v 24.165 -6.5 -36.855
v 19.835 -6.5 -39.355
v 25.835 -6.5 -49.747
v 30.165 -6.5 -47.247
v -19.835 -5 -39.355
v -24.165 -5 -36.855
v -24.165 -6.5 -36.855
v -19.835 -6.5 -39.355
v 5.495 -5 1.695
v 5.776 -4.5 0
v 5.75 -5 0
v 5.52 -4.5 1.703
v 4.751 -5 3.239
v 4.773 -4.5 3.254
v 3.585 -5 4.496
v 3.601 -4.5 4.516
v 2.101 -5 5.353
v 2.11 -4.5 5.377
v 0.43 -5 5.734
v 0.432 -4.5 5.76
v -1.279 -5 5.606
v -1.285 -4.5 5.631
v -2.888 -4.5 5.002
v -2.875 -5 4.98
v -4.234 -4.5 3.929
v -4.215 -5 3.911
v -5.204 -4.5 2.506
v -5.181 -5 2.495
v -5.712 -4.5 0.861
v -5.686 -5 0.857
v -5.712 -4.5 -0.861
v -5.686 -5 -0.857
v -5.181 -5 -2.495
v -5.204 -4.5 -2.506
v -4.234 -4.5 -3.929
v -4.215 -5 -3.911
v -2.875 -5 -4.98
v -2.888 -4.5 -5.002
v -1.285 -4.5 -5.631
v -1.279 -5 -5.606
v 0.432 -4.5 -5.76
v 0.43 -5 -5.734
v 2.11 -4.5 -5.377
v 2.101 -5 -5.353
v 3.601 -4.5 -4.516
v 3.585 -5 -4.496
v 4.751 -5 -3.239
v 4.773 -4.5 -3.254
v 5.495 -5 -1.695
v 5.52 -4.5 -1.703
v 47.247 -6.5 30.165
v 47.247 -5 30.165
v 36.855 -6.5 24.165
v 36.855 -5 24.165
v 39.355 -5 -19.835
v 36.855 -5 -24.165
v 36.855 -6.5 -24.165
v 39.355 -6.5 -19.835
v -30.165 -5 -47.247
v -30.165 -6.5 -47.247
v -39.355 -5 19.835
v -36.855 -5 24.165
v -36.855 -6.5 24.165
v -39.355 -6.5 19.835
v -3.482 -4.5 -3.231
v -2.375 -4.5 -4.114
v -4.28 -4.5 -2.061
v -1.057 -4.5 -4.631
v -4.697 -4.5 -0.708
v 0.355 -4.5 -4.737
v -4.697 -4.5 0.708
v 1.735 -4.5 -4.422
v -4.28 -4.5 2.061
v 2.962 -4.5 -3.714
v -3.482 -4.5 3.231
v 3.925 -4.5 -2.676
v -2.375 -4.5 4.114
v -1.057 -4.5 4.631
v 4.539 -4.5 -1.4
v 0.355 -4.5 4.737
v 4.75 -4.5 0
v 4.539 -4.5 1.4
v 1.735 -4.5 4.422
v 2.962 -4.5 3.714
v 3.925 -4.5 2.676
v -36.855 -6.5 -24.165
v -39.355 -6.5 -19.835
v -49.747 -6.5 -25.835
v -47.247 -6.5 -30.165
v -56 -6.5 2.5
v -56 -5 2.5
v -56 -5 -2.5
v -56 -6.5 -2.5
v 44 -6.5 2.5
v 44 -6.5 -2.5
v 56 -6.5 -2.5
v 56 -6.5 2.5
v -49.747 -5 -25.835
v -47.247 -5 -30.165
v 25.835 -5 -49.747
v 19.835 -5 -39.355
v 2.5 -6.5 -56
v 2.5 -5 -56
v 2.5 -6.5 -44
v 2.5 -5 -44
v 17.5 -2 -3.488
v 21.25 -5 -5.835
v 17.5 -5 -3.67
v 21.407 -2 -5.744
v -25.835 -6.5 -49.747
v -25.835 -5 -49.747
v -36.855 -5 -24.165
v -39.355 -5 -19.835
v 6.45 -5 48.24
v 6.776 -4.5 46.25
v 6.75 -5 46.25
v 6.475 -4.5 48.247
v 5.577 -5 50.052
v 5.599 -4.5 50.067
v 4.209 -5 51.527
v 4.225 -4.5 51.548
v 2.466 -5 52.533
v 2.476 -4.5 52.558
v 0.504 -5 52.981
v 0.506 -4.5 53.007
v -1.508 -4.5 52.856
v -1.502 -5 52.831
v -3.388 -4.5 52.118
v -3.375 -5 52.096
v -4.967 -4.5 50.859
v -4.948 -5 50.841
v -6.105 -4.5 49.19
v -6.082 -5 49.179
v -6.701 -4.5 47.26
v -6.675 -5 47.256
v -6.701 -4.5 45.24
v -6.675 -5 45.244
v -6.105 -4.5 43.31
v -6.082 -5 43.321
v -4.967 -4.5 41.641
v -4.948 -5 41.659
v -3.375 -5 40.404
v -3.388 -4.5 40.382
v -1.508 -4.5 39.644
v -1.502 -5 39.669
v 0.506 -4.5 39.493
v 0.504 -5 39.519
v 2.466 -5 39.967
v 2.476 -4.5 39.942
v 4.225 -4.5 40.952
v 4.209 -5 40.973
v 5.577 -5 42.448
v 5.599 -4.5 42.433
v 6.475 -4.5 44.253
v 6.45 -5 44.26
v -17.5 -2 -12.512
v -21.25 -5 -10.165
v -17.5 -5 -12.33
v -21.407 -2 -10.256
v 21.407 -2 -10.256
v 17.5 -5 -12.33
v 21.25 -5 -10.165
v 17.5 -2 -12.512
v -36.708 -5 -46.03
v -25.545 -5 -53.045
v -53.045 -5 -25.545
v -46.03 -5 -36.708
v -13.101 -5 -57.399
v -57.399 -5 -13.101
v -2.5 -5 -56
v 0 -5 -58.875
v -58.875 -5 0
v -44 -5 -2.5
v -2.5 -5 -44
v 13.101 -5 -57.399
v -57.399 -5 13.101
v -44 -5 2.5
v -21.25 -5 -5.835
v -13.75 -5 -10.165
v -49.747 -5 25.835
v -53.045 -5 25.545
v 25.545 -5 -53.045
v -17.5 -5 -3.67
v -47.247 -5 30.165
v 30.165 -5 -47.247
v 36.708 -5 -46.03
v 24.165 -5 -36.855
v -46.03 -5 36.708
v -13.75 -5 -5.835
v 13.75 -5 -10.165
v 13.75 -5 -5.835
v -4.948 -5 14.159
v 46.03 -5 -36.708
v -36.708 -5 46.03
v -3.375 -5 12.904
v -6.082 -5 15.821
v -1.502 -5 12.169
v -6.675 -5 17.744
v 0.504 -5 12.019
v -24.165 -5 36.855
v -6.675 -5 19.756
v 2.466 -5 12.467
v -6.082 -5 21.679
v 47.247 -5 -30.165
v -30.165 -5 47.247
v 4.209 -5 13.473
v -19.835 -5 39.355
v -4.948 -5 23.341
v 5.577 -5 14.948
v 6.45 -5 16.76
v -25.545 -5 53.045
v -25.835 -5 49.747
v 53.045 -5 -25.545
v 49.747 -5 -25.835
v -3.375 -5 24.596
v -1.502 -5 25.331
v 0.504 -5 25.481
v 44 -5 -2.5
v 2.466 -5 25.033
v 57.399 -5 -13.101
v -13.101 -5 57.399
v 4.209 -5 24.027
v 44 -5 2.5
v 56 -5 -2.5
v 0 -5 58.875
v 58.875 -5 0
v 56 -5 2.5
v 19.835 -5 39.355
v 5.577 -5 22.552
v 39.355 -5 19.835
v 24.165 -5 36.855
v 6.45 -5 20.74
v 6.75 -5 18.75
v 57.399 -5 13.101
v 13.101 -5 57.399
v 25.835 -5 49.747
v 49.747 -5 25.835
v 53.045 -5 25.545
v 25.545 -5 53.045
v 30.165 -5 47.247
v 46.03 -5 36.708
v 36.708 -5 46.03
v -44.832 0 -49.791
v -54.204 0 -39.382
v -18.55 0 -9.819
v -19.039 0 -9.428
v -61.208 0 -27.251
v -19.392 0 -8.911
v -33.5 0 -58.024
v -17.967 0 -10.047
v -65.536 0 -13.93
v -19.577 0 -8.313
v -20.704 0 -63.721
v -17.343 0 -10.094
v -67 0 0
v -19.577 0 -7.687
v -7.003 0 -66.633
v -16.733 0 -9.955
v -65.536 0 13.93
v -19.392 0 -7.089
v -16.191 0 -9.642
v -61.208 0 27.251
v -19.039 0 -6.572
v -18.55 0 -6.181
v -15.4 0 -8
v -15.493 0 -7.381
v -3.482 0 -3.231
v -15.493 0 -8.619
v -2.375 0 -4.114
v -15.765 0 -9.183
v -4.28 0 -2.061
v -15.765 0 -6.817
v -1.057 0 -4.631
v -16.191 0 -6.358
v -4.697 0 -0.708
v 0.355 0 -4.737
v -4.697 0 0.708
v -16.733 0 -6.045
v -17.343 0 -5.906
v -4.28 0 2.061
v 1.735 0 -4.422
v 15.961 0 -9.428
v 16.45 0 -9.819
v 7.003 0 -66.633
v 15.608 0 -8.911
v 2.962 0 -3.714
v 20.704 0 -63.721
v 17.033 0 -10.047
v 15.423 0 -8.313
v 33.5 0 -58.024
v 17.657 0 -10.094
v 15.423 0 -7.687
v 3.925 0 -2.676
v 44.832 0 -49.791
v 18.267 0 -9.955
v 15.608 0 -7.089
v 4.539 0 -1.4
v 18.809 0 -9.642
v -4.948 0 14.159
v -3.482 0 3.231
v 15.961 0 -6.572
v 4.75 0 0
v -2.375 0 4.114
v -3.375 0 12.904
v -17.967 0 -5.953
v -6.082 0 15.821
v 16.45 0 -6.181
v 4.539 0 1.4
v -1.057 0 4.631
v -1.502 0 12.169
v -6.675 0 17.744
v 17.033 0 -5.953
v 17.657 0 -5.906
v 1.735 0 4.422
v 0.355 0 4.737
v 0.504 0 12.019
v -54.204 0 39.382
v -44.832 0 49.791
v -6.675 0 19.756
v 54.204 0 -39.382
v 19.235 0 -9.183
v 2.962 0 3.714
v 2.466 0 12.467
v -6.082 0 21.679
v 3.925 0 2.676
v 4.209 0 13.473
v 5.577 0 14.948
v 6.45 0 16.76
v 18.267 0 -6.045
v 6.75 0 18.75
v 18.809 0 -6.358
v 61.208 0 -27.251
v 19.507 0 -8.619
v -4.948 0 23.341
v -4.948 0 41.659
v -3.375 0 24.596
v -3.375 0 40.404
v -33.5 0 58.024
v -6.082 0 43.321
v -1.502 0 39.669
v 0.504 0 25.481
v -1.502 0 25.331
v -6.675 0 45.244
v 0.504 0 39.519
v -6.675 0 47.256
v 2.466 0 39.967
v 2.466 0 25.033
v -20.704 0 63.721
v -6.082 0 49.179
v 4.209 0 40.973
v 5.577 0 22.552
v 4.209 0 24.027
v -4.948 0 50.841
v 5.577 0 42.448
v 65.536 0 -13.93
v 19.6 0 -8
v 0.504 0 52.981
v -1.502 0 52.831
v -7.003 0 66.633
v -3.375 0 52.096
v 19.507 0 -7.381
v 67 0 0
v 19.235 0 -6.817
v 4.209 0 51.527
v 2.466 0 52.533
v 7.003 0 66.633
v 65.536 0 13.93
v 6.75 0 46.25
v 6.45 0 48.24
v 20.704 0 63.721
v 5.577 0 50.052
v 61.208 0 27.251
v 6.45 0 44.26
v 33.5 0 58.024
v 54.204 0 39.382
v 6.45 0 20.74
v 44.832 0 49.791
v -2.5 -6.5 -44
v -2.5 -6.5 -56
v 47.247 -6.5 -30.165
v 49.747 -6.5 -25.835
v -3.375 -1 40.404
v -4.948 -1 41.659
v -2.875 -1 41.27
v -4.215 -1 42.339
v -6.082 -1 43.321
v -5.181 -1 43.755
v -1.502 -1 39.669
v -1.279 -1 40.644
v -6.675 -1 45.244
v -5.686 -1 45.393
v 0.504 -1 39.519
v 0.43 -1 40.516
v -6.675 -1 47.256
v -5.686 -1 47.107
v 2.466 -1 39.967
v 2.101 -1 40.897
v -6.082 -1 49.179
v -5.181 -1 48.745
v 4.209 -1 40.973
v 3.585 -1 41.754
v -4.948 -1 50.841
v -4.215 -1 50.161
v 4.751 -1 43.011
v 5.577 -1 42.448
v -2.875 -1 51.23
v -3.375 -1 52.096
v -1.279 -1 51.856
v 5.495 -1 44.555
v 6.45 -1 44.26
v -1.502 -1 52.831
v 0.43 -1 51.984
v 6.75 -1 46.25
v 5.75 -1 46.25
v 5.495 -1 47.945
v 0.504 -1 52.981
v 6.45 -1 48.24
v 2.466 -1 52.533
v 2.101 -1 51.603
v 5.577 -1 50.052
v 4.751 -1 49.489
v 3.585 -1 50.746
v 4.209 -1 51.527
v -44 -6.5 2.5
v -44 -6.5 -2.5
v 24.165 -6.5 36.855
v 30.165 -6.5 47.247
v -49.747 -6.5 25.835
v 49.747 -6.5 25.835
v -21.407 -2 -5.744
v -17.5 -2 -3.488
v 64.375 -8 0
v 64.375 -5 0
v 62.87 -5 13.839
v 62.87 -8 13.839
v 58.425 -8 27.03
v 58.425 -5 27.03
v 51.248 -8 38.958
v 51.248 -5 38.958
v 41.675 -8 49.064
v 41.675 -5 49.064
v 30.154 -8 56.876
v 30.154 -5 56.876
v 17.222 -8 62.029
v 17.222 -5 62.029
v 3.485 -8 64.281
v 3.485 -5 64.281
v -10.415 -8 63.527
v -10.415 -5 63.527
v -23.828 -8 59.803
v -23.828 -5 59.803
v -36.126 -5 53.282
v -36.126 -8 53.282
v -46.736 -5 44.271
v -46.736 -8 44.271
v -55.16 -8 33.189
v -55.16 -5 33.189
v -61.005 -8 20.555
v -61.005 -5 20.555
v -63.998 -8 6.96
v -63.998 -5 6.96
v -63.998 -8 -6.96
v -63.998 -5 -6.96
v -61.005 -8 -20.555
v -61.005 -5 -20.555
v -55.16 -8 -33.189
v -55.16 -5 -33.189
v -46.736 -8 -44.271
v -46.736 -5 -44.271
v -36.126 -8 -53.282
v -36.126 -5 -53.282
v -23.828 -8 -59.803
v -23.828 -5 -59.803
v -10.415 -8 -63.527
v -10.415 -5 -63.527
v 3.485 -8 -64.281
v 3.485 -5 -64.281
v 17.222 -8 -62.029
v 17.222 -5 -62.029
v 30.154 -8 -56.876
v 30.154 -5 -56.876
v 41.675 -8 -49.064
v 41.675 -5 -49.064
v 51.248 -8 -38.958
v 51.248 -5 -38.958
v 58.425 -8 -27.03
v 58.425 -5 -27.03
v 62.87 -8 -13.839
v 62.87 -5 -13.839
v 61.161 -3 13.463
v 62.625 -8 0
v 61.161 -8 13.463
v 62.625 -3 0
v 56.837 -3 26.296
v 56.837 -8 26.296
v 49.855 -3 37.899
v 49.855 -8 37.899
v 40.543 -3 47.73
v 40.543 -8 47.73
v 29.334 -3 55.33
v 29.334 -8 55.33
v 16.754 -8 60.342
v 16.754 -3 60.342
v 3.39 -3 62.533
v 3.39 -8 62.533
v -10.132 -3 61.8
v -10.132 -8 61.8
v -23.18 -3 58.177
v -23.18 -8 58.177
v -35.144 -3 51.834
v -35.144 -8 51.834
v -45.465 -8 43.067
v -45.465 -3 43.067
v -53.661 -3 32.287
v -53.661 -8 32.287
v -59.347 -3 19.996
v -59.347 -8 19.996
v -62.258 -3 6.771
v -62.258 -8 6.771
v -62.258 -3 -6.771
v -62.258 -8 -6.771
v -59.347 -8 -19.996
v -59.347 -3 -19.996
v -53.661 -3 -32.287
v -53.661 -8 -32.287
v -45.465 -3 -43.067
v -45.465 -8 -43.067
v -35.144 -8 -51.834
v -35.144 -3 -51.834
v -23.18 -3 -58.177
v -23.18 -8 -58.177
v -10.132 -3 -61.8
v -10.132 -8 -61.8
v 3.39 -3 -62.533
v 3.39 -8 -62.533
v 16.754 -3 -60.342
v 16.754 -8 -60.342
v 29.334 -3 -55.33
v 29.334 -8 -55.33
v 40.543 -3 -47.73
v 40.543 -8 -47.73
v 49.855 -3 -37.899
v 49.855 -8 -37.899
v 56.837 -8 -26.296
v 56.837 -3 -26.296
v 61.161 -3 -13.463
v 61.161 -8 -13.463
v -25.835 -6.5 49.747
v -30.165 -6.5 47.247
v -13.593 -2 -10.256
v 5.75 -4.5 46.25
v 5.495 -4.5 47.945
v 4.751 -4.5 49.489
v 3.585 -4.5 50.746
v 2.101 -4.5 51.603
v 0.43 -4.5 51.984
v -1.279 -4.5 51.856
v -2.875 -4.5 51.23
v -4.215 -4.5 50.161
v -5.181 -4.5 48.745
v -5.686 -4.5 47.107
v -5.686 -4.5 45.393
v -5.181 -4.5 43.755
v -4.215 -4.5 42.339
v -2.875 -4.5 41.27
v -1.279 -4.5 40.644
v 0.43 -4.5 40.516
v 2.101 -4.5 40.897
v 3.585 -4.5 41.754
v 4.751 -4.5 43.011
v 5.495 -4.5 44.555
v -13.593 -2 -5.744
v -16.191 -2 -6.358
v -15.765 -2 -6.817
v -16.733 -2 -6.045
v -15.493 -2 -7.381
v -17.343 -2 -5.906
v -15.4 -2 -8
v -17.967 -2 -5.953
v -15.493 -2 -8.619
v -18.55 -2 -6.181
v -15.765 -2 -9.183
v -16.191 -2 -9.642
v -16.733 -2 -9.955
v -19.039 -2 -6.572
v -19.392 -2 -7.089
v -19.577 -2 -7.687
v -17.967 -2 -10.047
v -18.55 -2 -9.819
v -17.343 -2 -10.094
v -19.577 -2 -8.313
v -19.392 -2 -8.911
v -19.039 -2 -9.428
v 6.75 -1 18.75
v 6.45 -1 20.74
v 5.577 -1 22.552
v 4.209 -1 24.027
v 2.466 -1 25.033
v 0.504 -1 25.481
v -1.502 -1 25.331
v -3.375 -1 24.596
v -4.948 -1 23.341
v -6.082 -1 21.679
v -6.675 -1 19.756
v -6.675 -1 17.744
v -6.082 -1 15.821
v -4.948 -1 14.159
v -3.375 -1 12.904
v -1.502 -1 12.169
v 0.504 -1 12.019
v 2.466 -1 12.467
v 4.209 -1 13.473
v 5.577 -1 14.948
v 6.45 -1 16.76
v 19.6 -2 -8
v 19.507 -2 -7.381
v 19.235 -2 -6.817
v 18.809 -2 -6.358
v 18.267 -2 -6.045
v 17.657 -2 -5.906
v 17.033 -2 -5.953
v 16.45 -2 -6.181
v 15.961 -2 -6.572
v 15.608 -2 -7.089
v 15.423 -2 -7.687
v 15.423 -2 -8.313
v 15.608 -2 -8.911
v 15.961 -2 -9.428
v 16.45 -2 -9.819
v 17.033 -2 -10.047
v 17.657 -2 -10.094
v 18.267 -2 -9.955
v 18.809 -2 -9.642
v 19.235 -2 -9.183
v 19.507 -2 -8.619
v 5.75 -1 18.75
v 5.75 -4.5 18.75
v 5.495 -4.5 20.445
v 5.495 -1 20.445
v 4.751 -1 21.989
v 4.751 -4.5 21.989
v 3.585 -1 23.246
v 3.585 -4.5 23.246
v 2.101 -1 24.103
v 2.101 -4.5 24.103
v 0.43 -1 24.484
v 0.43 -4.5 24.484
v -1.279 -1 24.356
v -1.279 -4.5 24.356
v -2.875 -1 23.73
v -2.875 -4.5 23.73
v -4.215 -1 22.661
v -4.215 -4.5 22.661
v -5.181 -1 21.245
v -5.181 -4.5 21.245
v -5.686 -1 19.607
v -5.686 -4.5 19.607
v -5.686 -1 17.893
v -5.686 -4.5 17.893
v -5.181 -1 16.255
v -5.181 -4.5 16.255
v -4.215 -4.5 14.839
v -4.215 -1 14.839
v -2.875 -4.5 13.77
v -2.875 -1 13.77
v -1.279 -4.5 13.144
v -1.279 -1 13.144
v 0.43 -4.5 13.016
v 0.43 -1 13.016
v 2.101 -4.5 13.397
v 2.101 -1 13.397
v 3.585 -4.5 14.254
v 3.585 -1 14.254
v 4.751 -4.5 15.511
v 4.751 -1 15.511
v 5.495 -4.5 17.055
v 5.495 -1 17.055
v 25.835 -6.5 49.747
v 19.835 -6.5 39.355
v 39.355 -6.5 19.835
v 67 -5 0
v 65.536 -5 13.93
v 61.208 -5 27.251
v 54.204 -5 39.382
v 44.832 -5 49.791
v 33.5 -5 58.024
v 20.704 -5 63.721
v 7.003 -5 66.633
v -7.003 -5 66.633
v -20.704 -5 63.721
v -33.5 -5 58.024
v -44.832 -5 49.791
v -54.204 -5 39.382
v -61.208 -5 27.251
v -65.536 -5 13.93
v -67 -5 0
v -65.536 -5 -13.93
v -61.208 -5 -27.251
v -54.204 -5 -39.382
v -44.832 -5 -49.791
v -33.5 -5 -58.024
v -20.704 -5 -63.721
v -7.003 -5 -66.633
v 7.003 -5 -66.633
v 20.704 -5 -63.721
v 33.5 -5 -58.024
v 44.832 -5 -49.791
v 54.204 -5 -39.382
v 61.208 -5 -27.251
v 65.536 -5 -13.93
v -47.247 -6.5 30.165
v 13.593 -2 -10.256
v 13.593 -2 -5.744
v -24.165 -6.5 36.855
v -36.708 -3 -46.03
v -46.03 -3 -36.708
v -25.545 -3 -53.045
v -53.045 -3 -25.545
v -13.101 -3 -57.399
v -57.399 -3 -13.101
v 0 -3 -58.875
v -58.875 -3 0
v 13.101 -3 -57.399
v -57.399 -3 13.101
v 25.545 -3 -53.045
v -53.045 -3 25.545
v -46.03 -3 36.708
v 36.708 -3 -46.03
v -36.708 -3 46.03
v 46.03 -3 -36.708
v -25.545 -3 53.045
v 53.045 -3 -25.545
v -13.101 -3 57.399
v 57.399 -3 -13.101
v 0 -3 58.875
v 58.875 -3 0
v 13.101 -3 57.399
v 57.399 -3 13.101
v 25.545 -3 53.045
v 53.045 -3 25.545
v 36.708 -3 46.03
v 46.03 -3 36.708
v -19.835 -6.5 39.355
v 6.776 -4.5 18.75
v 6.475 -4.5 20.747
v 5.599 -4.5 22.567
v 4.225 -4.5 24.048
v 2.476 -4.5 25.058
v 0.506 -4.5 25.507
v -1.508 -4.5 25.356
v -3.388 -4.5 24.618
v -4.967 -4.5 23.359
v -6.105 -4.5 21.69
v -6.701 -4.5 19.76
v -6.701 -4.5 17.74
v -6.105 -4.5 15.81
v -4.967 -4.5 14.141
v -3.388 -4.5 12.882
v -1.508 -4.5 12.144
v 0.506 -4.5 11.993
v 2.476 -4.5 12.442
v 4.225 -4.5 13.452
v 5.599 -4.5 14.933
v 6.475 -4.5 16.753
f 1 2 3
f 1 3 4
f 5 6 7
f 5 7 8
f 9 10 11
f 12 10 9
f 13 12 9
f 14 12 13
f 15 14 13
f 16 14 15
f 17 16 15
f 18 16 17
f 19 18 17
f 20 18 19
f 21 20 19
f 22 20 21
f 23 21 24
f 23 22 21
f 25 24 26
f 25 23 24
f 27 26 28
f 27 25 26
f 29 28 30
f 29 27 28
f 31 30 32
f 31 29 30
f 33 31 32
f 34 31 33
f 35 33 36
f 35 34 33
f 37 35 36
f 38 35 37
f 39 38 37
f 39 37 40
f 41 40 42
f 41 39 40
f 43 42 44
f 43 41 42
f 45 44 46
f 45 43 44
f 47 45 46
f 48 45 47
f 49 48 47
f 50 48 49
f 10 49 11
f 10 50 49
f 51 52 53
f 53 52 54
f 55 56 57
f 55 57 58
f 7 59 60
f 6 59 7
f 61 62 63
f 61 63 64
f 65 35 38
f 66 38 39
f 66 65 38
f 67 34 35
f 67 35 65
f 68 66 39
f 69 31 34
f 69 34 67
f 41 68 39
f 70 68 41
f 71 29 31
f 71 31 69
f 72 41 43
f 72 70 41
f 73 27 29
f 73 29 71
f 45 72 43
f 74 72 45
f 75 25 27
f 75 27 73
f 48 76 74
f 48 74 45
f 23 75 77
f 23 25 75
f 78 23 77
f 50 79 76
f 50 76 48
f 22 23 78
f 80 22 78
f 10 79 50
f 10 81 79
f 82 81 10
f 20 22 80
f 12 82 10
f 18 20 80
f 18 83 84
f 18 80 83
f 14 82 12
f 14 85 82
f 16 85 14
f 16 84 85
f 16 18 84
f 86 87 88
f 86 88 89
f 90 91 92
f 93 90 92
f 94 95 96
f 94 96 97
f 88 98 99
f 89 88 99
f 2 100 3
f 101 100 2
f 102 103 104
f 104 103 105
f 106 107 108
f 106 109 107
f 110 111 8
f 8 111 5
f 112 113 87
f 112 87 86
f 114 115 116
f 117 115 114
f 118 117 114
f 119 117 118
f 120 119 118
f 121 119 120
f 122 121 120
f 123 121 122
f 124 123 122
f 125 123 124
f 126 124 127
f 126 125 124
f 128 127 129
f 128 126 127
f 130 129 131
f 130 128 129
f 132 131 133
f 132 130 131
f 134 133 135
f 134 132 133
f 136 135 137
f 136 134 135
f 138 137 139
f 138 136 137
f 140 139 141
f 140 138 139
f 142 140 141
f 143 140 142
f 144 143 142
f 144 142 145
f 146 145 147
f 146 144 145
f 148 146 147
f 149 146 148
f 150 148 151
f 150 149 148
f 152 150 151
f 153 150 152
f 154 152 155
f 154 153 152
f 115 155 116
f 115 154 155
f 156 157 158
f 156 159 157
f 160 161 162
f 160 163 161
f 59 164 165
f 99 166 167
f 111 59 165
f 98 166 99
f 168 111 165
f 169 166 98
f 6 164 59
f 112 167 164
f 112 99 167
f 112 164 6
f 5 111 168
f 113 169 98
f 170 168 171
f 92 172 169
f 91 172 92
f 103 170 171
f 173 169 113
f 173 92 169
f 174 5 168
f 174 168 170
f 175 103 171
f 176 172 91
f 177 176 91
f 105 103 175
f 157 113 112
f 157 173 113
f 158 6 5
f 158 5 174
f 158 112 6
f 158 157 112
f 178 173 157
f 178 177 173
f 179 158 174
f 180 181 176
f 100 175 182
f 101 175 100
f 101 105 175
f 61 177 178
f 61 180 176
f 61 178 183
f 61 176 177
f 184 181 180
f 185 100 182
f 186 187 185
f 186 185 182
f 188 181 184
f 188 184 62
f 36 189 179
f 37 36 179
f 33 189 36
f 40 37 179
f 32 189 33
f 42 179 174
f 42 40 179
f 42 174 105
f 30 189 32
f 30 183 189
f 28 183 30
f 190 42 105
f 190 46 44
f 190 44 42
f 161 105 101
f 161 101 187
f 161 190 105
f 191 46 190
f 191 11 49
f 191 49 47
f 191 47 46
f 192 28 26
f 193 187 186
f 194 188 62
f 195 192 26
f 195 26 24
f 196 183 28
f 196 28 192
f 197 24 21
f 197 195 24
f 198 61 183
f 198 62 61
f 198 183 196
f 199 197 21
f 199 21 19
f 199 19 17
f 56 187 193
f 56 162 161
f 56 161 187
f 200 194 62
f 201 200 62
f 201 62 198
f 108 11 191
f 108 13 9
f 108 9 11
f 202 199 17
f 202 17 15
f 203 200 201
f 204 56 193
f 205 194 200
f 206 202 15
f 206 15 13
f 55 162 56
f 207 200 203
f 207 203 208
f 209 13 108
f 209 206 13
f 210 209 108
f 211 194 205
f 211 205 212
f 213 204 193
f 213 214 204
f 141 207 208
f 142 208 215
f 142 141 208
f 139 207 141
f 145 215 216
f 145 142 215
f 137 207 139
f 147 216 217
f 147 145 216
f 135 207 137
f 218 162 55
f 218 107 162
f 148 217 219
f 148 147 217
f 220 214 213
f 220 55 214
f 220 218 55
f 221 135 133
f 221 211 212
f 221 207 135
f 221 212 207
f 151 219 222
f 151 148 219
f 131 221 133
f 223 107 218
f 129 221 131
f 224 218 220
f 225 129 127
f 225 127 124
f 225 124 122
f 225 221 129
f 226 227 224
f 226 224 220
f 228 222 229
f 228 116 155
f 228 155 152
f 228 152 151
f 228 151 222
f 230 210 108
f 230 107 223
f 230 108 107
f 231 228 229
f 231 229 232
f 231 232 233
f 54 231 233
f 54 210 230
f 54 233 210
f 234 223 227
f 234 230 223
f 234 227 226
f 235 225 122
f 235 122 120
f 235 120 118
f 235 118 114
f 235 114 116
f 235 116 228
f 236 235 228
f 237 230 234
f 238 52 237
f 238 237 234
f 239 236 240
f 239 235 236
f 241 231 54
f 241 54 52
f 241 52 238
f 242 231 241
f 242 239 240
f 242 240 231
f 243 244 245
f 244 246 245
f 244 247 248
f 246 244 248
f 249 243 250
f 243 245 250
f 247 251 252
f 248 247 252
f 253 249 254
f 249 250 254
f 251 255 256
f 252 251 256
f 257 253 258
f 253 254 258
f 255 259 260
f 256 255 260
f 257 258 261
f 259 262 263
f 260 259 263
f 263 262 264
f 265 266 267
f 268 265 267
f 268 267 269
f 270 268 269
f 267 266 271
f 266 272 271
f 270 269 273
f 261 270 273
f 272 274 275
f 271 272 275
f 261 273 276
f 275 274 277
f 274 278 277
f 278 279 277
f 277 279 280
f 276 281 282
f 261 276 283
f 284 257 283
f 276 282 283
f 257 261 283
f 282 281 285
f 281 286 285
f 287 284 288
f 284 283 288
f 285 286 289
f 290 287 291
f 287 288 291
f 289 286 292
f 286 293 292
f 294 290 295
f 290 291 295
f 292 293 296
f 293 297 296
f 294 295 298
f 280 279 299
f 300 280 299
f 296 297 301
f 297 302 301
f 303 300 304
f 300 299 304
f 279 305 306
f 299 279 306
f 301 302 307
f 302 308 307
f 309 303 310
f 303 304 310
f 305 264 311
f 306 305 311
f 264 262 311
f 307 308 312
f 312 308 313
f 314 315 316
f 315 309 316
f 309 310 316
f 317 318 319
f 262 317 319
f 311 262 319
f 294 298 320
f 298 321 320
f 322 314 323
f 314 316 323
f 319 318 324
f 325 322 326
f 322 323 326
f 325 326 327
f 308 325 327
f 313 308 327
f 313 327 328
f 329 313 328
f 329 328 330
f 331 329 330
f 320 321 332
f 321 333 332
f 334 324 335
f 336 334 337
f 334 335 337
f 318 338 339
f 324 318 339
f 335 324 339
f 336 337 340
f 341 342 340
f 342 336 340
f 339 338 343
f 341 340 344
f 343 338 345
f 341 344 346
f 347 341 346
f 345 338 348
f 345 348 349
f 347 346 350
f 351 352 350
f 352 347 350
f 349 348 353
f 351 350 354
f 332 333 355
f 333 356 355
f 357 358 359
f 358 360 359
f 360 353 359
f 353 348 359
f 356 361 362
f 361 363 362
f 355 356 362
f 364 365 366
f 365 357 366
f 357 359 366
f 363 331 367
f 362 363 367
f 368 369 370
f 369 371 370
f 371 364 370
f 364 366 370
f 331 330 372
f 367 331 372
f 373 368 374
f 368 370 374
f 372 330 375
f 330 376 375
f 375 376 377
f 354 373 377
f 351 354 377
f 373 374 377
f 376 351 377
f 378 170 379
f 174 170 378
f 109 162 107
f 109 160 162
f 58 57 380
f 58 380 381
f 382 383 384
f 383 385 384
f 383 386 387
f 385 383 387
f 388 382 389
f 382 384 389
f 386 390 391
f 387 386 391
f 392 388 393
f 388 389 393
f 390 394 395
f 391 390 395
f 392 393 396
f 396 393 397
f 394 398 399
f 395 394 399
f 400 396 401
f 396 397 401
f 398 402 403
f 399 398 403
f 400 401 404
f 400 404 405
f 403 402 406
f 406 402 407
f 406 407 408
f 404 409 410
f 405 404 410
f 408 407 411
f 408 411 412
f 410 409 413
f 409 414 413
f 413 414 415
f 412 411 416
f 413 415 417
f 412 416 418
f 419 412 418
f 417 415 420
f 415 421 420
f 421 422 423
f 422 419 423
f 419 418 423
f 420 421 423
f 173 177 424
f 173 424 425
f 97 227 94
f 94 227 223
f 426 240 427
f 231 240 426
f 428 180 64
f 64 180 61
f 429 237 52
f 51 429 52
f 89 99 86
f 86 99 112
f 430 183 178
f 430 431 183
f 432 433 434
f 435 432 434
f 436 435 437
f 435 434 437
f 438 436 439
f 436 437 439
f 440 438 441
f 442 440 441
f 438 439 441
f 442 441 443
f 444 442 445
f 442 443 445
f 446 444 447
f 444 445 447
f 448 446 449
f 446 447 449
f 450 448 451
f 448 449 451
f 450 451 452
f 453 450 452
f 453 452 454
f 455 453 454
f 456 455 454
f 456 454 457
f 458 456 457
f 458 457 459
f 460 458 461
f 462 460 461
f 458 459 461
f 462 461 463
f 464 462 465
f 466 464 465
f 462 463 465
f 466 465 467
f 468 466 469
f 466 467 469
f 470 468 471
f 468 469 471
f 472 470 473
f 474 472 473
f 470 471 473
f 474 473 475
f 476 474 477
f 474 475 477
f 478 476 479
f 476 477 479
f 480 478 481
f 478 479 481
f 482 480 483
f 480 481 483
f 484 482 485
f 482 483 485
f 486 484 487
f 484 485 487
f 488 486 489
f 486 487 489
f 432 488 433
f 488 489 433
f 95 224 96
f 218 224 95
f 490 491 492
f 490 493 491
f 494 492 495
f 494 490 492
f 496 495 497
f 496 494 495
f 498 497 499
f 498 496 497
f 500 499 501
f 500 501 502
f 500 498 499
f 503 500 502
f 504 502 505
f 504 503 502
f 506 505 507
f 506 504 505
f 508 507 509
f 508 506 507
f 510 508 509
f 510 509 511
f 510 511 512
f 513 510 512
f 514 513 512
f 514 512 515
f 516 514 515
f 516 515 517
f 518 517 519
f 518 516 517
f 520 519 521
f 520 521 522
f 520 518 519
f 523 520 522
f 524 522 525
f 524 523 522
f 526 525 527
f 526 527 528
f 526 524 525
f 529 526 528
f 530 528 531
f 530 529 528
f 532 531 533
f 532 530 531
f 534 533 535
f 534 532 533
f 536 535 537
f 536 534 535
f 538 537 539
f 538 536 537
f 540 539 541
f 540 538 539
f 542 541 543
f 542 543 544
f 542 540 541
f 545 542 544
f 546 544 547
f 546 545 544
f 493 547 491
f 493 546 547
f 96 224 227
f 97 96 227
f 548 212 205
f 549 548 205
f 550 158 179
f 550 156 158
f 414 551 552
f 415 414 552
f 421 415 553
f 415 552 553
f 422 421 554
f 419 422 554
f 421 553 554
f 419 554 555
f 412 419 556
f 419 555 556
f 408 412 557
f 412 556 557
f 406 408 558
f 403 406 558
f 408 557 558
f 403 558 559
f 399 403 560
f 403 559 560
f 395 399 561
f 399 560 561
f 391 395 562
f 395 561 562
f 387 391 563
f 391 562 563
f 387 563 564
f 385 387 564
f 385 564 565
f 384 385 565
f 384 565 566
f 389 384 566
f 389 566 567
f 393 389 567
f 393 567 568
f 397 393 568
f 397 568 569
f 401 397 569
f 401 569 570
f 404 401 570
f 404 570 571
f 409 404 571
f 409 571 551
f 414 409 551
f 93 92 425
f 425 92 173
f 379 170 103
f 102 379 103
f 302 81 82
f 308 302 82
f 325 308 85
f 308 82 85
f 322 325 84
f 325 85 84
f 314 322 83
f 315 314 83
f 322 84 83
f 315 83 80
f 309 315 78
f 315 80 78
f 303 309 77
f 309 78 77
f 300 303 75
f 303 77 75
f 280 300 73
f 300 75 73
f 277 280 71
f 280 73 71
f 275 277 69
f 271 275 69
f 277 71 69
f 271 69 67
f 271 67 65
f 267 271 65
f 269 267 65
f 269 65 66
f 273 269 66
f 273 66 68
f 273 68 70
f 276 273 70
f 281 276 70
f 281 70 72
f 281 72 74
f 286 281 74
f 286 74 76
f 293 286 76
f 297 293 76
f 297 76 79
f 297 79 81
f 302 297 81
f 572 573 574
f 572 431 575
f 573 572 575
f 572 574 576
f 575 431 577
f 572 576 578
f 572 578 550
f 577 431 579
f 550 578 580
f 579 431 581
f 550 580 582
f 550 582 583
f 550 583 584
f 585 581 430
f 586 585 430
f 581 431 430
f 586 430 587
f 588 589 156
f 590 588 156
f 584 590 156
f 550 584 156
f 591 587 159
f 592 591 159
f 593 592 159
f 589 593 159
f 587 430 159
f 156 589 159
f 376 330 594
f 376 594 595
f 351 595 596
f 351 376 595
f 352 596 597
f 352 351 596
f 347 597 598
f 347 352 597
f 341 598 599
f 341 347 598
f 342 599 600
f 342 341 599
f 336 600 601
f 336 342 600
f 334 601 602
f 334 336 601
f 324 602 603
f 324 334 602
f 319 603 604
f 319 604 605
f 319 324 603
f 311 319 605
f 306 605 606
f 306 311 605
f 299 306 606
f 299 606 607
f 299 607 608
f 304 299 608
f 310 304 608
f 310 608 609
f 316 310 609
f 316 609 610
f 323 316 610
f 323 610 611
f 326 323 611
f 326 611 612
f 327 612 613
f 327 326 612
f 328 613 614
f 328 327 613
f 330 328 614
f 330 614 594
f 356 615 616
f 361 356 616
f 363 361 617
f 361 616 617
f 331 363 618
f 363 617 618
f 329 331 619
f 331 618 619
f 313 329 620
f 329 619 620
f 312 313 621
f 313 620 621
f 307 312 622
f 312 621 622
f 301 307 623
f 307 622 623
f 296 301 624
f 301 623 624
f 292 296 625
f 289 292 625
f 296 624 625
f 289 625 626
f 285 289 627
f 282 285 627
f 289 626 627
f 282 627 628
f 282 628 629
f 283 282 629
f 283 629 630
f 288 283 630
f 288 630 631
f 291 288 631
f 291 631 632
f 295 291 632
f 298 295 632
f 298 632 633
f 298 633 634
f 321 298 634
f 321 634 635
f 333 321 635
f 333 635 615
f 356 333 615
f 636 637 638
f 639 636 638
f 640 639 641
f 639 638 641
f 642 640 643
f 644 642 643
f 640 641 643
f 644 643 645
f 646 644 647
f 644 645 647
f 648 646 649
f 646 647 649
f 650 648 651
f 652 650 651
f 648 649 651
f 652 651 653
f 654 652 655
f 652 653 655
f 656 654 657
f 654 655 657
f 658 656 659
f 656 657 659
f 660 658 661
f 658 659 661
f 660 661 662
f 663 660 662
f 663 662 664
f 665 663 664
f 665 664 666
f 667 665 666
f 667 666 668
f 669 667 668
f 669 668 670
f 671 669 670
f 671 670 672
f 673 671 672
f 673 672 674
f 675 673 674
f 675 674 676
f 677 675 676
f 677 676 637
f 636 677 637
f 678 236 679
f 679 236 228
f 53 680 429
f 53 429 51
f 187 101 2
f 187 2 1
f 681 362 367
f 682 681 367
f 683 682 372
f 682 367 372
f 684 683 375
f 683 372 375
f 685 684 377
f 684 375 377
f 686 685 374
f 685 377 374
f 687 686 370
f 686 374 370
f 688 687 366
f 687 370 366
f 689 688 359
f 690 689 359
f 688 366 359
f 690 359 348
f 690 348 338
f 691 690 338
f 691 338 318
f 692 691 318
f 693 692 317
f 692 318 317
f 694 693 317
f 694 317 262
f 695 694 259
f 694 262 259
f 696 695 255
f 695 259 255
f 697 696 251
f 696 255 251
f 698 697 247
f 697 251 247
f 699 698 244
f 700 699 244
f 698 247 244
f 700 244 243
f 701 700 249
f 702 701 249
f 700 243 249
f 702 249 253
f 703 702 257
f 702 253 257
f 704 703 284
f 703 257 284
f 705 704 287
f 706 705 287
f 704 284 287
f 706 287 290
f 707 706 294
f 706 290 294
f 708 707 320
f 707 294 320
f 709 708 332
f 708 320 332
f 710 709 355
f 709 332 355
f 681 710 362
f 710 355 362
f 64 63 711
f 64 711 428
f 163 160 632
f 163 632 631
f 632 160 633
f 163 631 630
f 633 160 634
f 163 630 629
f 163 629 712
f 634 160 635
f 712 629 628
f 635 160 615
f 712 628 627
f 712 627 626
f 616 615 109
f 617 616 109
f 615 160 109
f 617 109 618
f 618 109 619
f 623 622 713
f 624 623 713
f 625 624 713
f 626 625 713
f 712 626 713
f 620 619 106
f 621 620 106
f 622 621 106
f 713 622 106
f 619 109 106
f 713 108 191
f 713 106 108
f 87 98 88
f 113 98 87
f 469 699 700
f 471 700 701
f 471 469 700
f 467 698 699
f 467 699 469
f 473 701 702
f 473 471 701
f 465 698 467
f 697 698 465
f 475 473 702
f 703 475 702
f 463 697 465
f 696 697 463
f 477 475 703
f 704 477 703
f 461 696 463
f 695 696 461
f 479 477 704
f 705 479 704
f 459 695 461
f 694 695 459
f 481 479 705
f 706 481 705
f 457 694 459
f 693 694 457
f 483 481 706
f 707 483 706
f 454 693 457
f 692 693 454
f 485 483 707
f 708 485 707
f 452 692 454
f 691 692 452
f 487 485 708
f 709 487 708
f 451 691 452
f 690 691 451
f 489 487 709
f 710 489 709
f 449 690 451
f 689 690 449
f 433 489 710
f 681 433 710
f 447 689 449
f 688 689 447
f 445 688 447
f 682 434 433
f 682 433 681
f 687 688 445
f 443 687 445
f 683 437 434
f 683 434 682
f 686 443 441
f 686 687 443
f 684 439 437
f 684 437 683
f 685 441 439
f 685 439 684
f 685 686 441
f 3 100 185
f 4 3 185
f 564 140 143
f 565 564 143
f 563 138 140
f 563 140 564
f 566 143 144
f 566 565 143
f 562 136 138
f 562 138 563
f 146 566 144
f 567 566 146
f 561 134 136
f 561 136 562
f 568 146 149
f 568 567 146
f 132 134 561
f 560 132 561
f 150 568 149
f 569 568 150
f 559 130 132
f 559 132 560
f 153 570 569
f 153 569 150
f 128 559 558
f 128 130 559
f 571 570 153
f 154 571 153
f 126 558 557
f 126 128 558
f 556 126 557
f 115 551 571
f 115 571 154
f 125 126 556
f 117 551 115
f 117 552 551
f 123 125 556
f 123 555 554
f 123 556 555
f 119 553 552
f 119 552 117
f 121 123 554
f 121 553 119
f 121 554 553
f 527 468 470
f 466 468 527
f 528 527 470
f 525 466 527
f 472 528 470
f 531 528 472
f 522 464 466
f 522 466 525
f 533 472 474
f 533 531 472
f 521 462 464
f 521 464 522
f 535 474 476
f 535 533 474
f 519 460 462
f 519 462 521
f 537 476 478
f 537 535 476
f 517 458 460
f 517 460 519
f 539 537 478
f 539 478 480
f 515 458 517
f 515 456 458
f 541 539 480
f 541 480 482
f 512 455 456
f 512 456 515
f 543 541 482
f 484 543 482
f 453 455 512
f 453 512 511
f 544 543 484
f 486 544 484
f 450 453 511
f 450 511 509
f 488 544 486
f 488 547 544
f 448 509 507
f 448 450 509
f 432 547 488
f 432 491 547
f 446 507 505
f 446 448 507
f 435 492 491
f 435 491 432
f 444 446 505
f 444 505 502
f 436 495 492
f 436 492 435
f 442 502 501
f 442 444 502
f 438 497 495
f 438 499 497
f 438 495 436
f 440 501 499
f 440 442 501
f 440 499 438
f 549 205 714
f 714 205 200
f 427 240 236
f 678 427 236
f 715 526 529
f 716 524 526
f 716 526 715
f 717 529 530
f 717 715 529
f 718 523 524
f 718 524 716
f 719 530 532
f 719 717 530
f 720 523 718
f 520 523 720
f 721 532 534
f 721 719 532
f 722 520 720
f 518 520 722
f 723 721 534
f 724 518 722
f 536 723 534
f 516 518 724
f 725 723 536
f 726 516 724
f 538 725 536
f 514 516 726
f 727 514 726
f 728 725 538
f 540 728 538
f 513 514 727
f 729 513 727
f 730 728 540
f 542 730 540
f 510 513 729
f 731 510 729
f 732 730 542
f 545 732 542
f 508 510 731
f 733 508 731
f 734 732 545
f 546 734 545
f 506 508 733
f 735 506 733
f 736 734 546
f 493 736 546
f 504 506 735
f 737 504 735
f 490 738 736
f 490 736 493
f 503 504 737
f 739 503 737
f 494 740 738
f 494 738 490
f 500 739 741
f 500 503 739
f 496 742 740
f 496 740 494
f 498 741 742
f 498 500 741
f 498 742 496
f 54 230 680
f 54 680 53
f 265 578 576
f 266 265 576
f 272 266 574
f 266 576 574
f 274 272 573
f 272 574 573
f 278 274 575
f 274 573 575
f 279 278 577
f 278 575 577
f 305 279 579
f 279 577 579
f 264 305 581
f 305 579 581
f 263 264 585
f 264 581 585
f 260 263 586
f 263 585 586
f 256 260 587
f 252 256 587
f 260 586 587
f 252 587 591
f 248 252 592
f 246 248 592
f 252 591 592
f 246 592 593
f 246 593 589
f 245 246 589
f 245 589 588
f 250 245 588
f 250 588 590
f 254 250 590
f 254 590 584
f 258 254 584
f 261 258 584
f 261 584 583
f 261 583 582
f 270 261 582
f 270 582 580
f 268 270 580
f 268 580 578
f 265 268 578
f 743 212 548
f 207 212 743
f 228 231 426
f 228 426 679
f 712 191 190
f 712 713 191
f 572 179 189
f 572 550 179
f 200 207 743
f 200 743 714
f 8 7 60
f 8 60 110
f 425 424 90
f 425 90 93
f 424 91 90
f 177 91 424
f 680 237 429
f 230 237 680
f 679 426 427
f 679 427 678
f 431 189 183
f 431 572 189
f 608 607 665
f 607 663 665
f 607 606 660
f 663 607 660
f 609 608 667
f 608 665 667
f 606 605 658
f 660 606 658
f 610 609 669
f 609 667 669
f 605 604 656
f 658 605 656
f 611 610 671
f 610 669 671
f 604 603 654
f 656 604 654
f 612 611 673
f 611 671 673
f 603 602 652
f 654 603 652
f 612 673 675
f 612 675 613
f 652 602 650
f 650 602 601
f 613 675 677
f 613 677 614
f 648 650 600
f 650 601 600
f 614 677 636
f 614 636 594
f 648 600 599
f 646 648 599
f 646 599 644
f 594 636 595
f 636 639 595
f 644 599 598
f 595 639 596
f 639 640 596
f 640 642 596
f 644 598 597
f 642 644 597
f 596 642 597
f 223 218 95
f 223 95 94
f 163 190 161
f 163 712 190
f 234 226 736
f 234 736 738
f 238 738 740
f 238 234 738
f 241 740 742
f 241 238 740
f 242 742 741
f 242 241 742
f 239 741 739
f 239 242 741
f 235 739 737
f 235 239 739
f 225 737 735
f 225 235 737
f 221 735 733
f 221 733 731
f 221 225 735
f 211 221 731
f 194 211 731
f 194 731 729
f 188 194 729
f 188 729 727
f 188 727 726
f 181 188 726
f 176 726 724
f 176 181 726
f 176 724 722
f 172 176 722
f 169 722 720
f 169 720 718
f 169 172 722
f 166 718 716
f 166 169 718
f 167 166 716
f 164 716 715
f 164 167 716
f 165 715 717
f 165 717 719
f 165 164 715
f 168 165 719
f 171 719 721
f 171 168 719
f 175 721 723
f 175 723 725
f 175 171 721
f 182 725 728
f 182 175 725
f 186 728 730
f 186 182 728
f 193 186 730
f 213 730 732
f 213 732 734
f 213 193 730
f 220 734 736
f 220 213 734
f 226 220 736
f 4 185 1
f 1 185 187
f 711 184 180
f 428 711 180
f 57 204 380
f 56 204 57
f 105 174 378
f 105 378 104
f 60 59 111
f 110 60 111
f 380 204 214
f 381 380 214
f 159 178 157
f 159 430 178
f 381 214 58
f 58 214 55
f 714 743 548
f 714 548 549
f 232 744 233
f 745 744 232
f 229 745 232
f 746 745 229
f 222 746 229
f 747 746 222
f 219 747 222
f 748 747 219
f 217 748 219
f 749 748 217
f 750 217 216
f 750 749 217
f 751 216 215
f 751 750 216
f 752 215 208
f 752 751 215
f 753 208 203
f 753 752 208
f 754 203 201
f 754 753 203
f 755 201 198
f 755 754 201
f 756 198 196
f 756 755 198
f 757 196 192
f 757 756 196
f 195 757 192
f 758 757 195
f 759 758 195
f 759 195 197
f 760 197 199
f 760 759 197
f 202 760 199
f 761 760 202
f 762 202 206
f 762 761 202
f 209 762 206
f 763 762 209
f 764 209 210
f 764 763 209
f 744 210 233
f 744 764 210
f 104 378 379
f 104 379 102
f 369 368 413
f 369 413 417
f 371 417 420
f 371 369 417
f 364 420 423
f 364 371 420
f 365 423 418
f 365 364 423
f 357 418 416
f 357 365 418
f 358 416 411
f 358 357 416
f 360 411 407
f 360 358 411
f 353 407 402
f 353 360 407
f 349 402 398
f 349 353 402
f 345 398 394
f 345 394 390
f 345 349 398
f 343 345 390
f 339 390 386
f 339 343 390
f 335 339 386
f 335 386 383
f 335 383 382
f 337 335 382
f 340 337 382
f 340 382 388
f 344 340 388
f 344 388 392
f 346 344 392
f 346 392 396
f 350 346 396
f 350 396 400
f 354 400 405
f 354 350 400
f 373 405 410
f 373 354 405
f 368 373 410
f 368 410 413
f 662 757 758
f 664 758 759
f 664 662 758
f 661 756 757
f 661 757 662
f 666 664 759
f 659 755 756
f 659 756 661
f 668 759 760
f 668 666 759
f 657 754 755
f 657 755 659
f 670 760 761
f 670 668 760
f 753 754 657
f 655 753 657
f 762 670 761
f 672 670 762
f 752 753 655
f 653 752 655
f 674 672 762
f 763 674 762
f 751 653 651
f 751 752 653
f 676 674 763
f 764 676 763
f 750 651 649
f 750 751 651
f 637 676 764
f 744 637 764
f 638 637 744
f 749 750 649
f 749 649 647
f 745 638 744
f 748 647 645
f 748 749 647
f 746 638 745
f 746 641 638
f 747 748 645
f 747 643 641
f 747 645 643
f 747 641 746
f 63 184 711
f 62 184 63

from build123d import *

# Parameters (mm, degrees)
F0_R      = 67
F1_DEPTH  = 5
F2_R      = 64.375
F2_R_2    = 62.625
F3_DEPTH  = 3
F2_R_3    = 58.875
F4_DEPTH  = 2
F5_R      = 4.75
F5_R_2    = 5.75
F5_R_3    = 2.1
F6_DEPTH  = 25
F7_R      = 5.75
F7_R_2    = 6.75
F8_DEPTH  = 0.5
F8_TAPER  = -3
F10_DEPTH = 3
F10_TAPER = -3
F11_R     = 6.75
F12_DEPTH = 1
F13_W     = 5
F13_H     = 12
F14_DEPTH = 1.5
F15_COUNT = 6
F15_ANGLE = 150
F16_COUNT = 6
F16_ANGLE = 150


with BuildPart() as f1:
    # F0 (on Front) → F1 (new body)
    with BuildSketch(Plane.XZ):
        Circle(F0_R)
    extrude(amount=F1_DEPTH)

    # F2 (on face) → F3 (join)
    with BuildSketch(Plane.XZ.offset(5)):
        Circle(F2_R)
        Circle(F2_R_2, mode=Mode.SUBTRACT)
    extrude(amount=F3_DEPTH)

    # F2 (on face) → F4 (cut)
    with BuildSketch(Plane.XZ.offset(5)):
        Circle(F2_R_2)
        Circle(F2_R_3, mode=Mode.SUBTRACT)
    extrude(amount=-F4_DEPTH, mode=Mode.SUBTRACT)

    # F5 (on face) → F6 (cut)
    with BuildSketch(Plane.XZ.offset(5)):
        Circle(F5_R)
        with Locations((0, 18.75)):
            Circle(F5_R_2)
        with Locations((0, 46.25)):
            Circle(F5_R_2)
        with Locations((17.5, -8)):
            Circle(F5_R_3)
        with Locations((-17.5, -8)):
            Circle(F5_R_3)
    extrude(amount=-F6_DEPTH, mode=Mode.SUBTRACT)

    # F7 (on face) → F8 (cut)
    with BuildSketch(Plane.XZ.offset(5)):
        Circle(F7_R)
        with Locations((0, 18.75)):
            Circle(F7_R_2)
        with Locations((0, 46.25)):
            Circle(F7_R_2)
    extrude(amount=-F8_DEPTH, taper=F8_TAPER, mode=Mode.SUBTRACT)

    # F9 (on face) → F10 (cut)
    with BuildSketch(Plane.XZ.offset(5)):
        Polygon((21.25, -10.1650635095), (21.25, -5.8349364905), (17.5, -3.6698729811), (13.75, -5.8349364905), (13.75, -10.1650635095), (17.5, -12.3301270189), align=None)
        Polygon((-17.5, -3.6698729811), (-21.25, -5.8349364905), (-21.25, -10.1650635095), (-17.5, -12.3301270189), (-13.75, -10.1650635095), (-13.75, -5.8349364905), align=None)
    extrude(amount=-F10_DEPTH, taper=F10_TAPER, mode=Mode.SUBTRACT)

    # F11 (on Front) → F12 (cut)
    with BuildSketch(Plane.XZ):
        with Locations((0, 46.25)):
            Circle(F11_R)
        with Locations((0, 18.75)):
            Circle(F11_R)
    extrude(amount=F12_DEPTH, mode=Mode.SUBTRACT)

    # F13 (on face) → F14 (join)
    with BuildSketch(Plane.XZ.offset(5)):
        with Locations((0, -50)):
            Rectangle(F13_W, F13_H)
    f14 = extrude(amount=F14_DEPTH)

    # F15: F14 ×6 about axis
    f15_axis = Axis((0, -5, 0), (0, -1, 0))
    for i in range(1, F15_COUNT):
        add(f14.rotate(f15_axis, i * F15_ANGLE / (F15_COUNT - 1)))

    # F16: F14 ×6 about axis
    f16_axis = Axis((0, -5, 0), (0, 1, 0))
    for i in range(1, F16_COUNT):
        add(f14.rotate(f16_axis, i * F16_ANGLE / (F16_COUNT - 1)))


solid = f1.part
